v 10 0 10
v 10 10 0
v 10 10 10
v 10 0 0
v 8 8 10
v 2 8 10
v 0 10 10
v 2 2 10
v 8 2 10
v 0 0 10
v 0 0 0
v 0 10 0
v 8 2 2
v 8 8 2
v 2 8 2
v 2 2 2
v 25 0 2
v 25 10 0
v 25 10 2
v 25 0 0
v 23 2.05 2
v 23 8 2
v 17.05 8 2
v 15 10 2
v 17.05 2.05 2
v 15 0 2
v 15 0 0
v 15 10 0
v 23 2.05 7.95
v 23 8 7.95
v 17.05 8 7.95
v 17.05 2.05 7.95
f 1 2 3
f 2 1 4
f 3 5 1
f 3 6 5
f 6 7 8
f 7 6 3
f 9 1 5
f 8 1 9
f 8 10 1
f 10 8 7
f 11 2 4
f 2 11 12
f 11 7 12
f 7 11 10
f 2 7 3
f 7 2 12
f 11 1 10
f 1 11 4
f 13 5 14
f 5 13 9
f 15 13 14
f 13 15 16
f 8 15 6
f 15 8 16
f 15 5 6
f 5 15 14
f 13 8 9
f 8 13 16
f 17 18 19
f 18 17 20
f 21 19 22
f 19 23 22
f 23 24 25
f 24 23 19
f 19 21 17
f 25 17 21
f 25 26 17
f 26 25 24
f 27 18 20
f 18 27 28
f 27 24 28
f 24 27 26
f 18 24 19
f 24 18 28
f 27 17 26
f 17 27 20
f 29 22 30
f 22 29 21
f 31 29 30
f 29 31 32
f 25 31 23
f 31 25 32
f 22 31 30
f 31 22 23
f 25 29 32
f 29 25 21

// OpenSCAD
diff=0.1;
size=10;
extra=size/5;

difference() {
    cube(size);
    translate([extra, extra, extra])
        cube([size-extra*2,size-extra*2,size]);
}

translate([size*1.5,0,0]) {
    cube([size,size,extra]);
    translate([extra+diff/2,extra+diff/2,extra])
        cube([size-extra*2-diff/2,size-extra*2-diff/2,size-extra*2-diff/2]);
}
